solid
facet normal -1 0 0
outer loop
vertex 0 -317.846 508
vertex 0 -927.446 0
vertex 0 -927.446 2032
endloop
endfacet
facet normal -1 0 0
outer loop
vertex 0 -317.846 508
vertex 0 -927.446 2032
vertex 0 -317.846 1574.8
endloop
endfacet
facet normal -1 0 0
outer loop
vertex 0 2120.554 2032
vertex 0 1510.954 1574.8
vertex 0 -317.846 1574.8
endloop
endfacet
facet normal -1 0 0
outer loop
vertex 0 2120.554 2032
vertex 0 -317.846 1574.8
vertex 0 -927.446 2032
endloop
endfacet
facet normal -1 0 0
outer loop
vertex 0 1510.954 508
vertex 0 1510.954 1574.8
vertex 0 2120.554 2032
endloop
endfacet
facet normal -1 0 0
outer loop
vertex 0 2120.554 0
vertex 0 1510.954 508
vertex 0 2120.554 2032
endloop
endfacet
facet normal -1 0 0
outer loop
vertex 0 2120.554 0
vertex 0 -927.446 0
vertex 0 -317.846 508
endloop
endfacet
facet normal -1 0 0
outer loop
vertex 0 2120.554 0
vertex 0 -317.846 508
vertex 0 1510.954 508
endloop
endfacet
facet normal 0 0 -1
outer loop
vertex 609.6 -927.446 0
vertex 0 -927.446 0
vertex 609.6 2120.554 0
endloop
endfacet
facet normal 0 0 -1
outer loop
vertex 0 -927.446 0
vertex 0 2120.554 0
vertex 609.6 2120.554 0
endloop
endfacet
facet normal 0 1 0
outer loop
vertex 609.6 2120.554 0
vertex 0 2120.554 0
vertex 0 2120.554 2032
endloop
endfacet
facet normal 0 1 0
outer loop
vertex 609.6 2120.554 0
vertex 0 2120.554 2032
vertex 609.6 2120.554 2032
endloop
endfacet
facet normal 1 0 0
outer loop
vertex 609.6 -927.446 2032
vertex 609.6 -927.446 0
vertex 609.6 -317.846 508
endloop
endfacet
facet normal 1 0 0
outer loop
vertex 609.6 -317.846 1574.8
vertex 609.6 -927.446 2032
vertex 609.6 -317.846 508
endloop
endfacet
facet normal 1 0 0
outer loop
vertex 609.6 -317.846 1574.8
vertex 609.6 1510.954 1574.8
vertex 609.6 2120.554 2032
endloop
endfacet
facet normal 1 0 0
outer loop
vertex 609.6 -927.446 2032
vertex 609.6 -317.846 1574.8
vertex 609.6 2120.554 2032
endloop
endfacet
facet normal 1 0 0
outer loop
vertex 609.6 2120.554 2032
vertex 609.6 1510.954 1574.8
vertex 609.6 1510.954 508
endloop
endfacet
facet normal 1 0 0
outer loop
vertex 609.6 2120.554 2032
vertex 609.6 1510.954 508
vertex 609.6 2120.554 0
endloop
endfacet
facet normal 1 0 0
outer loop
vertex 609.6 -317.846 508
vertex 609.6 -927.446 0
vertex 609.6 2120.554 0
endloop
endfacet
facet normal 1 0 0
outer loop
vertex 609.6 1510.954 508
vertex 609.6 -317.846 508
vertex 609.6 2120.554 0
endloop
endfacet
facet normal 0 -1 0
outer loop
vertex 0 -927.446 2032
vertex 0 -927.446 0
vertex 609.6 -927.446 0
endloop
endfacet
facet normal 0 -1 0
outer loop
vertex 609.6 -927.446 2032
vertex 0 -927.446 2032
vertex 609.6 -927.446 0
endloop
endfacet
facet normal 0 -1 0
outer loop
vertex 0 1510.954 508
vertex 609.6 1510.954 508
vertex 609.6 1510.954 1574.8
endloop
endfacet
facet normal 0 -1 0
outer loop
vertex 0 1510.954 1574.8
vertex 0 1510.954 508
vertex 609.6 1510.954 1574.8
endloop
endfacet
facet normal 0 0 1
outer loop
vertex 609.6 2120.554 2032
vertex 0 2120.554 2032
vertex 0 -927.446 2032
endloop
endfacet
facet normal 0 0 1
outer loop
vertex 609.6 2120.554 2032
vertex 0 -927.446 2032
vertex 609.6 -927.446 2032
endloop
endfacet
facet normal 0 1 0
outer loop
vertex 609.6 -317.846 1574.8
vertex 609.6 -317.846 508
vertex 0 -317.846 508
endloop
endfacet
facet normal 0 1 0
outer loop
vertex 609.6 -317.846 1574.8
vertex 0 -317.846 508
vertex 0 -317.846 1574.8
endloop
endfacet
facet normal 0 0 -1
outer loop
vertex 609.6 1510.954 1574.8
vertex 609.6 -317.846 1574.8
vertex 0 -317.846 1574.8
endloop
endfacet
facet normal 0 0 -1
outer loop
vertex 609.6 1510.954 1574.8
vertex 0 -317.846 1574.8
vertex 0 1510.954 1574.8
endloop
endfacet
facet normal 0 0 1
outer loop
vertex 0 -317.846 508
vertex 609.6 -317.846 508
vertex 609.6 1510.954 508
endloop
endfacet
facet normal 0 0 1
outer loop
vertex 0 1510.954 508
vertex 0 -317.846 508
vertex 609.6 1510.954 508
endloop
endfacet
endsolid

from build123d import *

# Parameters (mm, degrees)
F0_W     = 609.6
F0_H     = 1828.8
F1_DEPTH = 508
F4_W     = 609.6
F4_H     = 3048
F5_DEPTH = 2032
F6_W     = 1828.8
F6_H     = 1066.8
F7_DEPTH = 609.6


with BuildPart() as f1:
    # F0 (on Top) → F1 (new body)
    with BuildSketch(Plane.XY):
        with Locations((304.8, 596.553694)):
            Rectangle(F0_W, F0_H)
    extrude(amount=F1_DEPTH)

    # F4 (on Top) → F5 (join)
    with BuildSketch(Plane.XY):
        with Locations((304.8, 596.553694)):
            Rectangle(F4_W, F4_H)
    extrude(amount=F5_DEPTH)

    # F6 (on face) → F7 (cut, through all)
    with BuildSketch(Plane.YZ.offset(609.6)):
        with Locations((596.553694, 1041.4)):
            Rectangle(F6_W, F6_H)
    extrude(amount=-F7_DEPTH, mode=Mode.SUBTRACT)


solid = f1.part
